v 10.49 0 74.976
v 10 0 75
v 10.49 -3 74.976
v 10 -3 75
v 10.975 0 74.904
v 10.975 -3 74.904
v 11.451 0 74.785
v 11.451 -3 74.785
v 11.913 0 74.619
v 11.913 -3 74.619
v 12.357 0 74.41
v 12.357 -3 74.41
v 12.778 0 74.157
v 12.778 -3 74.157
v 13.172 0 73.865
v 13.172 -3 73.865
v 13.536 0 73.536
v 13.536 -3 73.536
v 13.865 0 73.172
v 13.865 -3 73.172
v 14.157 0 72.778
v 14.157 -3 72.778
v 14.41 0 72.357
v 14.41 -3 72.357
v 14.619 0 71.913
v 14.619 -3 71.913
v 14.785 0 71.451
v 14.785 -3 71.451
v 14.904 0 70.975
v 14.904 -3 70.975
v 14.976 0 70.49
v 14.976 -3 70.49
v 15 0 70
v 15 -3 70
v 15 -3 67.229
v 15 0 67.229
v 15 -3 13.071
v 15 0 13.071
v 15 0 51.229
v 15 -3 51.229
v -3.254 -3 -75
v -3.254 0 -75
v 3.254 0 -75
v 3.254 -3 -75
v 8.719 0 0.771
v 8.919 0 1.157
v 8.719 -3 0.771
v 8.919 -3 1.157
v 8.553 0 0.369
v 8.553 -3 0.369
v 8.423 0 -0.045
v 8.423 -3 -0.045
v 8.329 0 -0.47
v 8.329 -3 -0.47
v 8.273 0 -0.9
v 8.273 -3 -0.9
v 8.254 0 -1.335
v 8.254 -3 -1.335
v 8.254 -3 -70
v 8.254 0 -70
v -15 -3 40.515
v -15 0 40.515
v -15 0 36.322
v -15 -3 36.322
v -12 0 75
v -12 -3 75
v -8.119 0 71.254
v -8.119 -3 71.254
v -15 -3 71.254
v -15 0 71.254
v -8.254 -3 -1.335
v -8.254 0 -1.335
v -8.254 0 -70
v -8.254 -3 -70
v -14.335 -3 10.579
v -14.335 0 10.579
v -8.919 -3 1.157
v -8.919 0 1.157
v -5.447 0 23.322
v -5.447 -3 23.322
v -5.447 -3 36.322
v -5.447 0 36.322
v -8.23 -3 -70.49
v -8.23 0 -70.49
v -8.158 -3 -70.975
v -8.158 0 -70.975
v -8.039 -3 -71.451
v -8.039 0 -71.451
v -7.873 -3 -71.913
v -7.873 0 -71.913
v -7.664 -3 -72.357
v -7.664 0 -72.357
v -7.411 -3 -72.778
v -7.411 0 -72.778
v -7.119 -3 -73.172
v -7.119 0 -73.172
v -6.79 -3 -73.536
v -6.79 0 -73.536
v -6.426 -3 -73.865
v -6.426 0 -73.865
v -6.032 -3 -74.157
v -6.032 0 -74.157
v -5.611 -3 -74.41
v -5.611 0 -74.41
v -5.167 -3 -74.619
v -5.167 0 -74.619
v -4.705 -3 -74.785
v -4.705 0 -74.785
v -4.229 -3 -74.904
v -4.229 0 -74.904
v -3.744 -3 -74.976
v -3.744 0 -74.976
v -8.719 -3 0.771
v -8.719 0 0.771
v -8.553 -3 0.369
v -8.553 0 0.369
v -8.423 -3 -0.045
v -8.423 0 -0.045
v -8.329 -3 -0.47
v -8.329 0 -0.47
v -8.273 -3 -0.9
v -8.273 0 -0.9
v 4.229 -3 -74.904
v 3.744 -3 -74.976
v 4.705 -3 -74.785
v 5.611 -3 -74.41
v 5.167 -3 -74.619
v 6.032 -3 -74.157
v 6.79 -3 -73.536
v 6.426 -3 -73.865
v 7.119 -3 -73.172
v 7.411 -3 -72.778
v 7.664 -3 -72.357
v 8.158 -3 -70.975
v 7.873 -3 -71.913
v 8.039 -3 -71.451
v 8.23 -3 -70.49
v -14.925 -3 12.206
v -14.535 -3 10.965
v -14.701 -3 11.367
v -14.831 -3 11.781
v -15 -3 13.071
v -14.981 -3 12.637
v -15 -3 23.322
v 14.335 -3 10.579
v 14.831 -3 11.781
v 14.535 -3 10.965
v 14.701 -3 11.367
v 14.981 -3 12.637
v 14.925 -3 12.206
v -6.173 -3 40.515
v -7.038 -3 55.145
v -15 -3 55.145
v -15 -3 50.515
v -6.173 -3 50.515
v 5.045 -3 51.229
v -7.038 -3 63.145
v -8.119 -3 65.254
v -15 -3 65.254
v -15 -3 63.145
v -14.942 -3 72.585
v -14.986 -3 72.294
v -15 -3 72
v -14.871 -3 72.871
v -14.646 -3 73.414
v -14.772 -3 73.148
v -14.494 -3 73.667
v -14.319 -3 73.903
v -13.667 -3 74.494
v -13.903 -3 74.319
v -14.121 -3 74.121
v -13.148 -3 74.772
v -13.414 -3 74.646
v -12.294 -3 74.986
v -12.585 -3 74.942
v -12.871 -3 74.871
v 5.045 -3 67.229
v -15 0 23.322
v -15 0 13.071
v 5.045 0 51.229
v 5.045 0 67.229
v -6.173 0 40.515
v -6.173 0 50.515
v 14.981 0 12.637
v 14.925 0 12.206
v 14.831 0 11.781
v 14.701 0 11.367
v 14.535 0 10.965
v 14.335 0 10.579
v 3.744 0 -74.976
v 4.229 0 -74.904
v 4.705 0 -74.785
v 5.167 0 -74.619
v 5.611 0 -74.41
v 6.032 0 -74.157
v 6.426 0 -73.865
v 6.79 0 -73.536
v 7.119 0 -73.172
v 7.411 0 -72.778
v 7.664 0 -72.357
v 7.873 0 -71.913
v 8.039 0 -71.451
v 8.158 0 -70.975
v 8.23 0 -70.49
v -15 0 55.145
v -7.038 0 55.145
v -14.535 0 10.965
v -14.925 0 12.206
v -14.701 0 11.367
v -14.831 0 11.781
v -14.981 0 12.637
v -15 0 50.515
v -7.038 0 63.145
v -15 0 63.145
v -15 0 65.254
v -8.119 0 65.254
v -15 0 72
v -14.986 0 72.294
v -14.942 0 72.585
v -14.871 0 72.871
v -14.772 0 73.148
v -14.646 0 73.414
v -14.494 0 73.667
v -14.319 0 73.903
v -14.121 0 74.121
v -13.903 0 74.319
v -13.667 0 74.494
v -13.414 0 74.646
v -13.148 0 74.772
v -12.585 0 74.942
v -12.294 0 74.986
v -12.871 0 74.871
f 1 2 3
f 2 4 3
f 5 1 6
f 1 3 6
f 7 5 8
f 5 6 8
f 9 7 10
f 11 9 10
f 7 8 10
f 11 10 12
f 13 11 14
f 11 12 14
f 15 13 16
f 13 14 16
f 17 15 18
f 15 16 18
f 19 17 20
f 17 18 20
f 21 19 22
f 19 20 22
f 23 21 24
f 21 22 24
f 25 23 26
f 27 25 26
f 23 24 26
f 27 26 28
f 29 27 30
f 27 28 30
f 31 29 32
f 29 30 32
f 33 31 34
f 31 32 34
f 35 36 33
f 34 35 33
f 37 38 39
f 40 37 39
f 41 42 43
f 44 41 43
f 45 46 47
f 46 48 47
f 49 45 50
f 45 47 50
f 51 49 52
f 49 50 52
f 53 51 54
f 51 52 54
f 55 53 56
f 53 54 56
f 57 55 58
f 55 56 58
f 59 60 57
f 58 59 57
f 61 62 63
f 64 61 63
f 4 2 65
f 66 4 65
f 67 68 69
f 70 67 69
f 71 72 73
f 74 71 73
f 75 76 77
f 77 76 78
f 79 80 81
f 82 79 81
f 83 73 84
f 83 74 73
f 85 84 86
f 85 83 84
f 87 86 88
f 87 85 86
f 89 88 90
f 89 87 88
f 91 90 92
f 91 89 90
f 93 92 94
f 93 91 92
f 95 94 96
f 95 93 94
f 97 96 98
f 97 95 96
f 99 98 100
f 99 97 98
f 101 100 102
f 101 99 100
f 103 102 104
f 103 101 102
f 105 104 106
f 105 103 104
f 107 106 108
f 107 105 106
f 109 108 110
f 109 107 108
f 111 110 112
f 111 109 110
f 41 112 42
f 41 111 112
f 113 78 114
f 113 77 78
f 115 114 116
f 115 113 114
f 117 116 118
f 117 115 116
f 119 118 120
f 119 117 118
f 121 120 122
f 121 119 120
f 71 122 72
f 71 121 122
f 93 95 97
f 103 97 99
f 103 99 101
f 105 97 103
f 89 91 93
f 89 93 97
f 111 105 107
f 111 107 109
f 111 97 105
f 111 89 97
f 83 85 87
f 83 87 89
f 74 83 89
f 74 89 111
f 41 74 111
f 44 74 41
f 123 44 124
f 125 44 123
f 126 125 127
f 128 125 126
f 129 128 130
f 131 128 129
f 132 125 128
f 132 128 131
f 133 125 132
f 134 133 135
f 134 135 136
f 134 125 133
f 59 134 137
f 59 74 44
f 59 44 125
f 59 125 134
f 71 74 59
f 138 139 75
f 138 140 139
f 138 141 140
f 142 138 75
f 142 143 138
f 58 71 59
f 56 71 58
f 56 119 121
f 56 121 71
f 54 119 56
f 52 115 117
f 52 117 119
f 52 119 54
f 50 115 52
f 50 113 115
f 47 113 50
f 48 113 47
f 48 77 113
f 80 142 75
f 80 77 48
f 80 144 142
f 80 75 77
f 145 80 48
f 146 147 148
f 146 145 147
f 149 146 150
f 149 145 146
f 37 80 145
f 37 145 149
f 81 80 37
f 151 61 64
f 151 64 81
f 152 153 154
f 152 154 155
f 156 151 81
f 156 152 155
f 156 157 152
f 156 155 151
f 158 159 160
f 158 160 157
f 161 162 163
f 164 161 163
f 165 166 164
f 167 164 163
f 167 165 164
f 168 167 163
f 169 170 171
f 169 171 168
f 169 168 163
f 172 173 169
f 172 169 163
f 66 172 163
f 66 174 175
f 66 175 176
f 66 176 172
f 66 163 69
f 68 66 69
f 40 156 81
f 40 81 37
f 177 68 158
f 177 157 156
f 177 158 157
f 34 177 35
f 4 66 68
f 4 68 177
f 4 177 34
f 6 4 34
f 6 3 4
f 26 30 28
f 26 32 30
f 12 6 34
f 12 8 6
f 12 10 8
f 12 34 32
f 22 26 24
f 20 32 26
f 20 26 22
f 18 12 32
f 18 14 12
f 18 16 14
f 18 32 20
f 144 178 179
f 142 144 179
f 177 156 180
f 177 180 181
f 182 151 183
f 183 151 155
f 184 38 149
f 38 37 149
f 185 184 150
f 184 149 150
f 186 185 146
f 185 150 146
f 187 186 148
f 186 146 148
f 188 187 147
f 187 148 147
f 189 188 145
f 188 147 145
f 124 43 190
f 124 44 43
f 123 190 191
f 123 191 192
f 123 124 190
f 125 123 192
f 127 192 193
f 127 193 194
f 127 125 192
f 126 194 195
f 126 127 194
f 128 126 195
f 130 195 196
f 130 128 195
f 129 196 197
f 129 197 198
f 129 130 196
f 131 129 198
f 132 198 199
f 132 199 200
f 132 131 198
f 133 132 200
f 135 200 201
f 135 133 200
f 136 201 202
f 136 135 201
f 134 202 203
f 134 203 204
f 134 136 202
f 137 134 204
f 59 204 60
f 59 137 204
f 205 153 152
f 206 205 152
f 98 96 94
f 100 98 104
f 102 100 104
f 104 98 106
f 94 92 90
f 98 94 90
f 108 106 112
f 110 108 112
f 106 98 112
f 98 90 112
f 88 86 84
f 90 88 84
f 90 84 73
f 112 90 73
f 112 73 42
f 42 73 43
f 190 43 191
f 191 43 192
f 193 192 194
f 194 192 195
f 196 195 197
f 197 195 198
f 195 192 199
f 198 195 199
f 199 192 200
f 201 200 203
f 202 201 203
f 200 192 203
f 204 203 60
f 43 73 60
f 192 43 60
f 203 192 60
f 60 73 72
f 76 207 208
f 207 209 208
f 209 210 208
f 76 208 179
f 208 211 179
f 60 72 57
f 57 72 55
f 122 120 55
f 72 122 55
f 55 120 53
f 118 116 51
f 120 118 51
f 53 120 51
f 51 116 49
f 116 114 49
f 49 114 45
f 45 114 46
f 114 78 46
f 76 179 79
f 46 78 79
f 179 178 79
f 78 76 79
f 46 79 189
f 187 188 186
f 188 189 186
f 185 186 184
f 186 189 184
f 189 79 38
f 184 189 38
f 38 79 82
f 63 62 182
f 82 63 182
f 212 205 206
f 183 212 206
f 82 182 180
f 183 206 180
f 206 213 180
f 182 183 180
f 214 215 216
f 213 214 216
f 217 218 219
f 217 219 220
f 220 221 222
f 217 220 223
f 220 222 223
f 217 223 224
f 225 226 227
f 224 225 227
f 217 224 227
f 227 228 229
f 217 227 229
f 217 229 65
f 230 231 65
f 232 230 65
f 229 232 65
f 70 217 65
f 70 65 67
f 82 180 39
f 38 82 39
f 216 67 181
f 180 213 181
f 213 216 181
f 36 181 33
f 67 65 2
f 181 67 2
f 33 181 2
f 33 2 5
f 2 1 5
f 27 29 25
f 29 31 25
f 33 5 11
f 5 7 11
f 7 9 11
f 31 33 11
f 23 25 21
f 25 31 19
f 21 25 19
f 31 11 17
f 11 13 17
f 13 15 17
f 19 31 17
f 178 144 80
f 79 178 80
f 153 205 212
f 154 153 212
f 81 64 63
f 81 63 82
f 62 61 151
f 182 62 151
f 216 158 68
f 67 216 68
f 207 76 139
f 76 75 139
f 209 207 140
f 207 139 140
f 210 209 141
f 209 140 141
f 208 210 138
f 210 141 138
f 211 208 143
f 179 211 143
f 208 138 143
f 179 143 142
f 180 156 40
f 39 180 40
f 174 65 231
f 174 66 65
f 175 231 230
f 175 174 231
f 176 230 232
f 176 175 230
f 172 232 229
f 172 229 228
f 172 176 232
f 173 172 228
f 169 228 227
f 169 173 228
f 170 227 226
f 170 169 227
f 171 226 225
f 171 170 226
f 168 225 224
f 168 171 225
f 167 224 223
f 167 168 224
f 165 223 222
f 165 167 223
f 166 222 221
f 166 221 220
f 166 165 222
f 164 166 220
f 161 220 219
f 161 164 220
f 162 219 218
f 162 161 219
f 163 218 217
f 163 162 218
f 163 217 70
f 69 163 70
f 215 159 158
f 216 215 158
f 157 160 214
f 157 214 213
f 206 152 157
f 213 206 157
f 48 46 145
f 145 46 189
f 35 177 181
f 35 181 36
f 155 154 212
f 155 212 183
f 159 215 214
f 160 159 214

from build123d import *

# Parameters (mm, degrees)
F1_DEPTH = 3
F2_W     = 10.790673
F2_H     = 8
F2_W_2   = 11.792415
F2_H_2   = 10
F2_W_3   = 13.604847
F2_H_3   = 13
F2_W_4   = 18.819063
F2_H_4   = 16
F3_DEPTH = 25
F4_R     = 5
F5_R     = 3
F6_R     = 5
F7_R     = 5
F8_R     = 5
F9_R     = 5
F10_R    = 5
F11_R    = 5


with BuildPart() as f1:
    # F0 (on Front) → F1 (new body)
    with BuildSketch(Plane.XZ):
        Polygon((15, 75), (-15, 75), (-15, 11.736112), (-8.253973, 0), (-8.253973, -75), (0, -75), (8.253973, -75), (8.253973, 0), (15, 11.736112), align=None)
    extrude(amount=F1_DEPTH)

    # F2 (on face) → F3 (cut)
    with BuildSketch(Plane.XZ.offset(3)):
        Polygon((-8.118863, 71.253784), (-15, 71.253784), (-17.755223, 71.253784), (-17.755223, 65.253784), (-8.118863, 65.253784), align=None)
        with Locations((-12.433694, 59.144969)):
            Rectangle(F2_W, F2_H)
        with Locations((-12.069519, 45.514927)):
            Rectangle(F2_W_2, F2_H_2)
        with Locations((-12.249198, 29.82161)):
            Rectangle(F2_W_3, F2_H_3)
        with Locations((14.454825, 59.229082)):
            Rectangle(F2_W_4, F2_H_4)
    extrude(amount=-F3_DEPTH, mode=Mode.SUBTRACT)

    # F4
    f4_edges = [f1.edges().sort_by_distance(p)[0] for p in [
        (15, -1.5, 75),
    ]]
    fillet(f4_edges, radius=F4_R)

    # F5
    f5_edges = [f1.edges().sort_by_distance(p)[0] for p in [
        (-15, -1.5, 75),
    ]]
    fillet(f5_edges, radius=F5_R)

    # F6
    f6_edges = [f1.edges().sort_by_distance(p)[0] for p in [
        (15, -1.5, 11.736112),
    ]]
    fillet(f6_edges, radius=F6_R)

    # F7
    f7_edges = [f1.edges().sort_by_distance(p)[0] for p in [
        (8.253973, -1.5, 0),
    ]]
    fillet(f7_edges, radius=F7_R)

    # F8
    f8_edges = [f1.edges().sort_by_distance(p)[0] for p in [
        (-15, -1.5, 11.736112),
    ]]
    fillet(f8_edges, radius=F8_R)

    # F9
    f9_edges = [f1.edges().sort_by_distance(p)[0] for p in [
        (-8.253973, -1.5, 0),
    ]]
    fillet(f9_edges, radius=F9_R)

    # F10
    f10_edges = [f1.edges().sort_by_distance(p)[0] for p in [
        (-8.253973, -1.5, -75),
    ]]
    fillet(f10_edges, radius=F10_R)

    # F11
    f11_edges = [f1.edges().sort_by_distance(p)[0] for p in [
        (8.253973, -1.5, -75),
    ]]
    fillet(f11_edges, radius=F11_R)


solid = f1.part
